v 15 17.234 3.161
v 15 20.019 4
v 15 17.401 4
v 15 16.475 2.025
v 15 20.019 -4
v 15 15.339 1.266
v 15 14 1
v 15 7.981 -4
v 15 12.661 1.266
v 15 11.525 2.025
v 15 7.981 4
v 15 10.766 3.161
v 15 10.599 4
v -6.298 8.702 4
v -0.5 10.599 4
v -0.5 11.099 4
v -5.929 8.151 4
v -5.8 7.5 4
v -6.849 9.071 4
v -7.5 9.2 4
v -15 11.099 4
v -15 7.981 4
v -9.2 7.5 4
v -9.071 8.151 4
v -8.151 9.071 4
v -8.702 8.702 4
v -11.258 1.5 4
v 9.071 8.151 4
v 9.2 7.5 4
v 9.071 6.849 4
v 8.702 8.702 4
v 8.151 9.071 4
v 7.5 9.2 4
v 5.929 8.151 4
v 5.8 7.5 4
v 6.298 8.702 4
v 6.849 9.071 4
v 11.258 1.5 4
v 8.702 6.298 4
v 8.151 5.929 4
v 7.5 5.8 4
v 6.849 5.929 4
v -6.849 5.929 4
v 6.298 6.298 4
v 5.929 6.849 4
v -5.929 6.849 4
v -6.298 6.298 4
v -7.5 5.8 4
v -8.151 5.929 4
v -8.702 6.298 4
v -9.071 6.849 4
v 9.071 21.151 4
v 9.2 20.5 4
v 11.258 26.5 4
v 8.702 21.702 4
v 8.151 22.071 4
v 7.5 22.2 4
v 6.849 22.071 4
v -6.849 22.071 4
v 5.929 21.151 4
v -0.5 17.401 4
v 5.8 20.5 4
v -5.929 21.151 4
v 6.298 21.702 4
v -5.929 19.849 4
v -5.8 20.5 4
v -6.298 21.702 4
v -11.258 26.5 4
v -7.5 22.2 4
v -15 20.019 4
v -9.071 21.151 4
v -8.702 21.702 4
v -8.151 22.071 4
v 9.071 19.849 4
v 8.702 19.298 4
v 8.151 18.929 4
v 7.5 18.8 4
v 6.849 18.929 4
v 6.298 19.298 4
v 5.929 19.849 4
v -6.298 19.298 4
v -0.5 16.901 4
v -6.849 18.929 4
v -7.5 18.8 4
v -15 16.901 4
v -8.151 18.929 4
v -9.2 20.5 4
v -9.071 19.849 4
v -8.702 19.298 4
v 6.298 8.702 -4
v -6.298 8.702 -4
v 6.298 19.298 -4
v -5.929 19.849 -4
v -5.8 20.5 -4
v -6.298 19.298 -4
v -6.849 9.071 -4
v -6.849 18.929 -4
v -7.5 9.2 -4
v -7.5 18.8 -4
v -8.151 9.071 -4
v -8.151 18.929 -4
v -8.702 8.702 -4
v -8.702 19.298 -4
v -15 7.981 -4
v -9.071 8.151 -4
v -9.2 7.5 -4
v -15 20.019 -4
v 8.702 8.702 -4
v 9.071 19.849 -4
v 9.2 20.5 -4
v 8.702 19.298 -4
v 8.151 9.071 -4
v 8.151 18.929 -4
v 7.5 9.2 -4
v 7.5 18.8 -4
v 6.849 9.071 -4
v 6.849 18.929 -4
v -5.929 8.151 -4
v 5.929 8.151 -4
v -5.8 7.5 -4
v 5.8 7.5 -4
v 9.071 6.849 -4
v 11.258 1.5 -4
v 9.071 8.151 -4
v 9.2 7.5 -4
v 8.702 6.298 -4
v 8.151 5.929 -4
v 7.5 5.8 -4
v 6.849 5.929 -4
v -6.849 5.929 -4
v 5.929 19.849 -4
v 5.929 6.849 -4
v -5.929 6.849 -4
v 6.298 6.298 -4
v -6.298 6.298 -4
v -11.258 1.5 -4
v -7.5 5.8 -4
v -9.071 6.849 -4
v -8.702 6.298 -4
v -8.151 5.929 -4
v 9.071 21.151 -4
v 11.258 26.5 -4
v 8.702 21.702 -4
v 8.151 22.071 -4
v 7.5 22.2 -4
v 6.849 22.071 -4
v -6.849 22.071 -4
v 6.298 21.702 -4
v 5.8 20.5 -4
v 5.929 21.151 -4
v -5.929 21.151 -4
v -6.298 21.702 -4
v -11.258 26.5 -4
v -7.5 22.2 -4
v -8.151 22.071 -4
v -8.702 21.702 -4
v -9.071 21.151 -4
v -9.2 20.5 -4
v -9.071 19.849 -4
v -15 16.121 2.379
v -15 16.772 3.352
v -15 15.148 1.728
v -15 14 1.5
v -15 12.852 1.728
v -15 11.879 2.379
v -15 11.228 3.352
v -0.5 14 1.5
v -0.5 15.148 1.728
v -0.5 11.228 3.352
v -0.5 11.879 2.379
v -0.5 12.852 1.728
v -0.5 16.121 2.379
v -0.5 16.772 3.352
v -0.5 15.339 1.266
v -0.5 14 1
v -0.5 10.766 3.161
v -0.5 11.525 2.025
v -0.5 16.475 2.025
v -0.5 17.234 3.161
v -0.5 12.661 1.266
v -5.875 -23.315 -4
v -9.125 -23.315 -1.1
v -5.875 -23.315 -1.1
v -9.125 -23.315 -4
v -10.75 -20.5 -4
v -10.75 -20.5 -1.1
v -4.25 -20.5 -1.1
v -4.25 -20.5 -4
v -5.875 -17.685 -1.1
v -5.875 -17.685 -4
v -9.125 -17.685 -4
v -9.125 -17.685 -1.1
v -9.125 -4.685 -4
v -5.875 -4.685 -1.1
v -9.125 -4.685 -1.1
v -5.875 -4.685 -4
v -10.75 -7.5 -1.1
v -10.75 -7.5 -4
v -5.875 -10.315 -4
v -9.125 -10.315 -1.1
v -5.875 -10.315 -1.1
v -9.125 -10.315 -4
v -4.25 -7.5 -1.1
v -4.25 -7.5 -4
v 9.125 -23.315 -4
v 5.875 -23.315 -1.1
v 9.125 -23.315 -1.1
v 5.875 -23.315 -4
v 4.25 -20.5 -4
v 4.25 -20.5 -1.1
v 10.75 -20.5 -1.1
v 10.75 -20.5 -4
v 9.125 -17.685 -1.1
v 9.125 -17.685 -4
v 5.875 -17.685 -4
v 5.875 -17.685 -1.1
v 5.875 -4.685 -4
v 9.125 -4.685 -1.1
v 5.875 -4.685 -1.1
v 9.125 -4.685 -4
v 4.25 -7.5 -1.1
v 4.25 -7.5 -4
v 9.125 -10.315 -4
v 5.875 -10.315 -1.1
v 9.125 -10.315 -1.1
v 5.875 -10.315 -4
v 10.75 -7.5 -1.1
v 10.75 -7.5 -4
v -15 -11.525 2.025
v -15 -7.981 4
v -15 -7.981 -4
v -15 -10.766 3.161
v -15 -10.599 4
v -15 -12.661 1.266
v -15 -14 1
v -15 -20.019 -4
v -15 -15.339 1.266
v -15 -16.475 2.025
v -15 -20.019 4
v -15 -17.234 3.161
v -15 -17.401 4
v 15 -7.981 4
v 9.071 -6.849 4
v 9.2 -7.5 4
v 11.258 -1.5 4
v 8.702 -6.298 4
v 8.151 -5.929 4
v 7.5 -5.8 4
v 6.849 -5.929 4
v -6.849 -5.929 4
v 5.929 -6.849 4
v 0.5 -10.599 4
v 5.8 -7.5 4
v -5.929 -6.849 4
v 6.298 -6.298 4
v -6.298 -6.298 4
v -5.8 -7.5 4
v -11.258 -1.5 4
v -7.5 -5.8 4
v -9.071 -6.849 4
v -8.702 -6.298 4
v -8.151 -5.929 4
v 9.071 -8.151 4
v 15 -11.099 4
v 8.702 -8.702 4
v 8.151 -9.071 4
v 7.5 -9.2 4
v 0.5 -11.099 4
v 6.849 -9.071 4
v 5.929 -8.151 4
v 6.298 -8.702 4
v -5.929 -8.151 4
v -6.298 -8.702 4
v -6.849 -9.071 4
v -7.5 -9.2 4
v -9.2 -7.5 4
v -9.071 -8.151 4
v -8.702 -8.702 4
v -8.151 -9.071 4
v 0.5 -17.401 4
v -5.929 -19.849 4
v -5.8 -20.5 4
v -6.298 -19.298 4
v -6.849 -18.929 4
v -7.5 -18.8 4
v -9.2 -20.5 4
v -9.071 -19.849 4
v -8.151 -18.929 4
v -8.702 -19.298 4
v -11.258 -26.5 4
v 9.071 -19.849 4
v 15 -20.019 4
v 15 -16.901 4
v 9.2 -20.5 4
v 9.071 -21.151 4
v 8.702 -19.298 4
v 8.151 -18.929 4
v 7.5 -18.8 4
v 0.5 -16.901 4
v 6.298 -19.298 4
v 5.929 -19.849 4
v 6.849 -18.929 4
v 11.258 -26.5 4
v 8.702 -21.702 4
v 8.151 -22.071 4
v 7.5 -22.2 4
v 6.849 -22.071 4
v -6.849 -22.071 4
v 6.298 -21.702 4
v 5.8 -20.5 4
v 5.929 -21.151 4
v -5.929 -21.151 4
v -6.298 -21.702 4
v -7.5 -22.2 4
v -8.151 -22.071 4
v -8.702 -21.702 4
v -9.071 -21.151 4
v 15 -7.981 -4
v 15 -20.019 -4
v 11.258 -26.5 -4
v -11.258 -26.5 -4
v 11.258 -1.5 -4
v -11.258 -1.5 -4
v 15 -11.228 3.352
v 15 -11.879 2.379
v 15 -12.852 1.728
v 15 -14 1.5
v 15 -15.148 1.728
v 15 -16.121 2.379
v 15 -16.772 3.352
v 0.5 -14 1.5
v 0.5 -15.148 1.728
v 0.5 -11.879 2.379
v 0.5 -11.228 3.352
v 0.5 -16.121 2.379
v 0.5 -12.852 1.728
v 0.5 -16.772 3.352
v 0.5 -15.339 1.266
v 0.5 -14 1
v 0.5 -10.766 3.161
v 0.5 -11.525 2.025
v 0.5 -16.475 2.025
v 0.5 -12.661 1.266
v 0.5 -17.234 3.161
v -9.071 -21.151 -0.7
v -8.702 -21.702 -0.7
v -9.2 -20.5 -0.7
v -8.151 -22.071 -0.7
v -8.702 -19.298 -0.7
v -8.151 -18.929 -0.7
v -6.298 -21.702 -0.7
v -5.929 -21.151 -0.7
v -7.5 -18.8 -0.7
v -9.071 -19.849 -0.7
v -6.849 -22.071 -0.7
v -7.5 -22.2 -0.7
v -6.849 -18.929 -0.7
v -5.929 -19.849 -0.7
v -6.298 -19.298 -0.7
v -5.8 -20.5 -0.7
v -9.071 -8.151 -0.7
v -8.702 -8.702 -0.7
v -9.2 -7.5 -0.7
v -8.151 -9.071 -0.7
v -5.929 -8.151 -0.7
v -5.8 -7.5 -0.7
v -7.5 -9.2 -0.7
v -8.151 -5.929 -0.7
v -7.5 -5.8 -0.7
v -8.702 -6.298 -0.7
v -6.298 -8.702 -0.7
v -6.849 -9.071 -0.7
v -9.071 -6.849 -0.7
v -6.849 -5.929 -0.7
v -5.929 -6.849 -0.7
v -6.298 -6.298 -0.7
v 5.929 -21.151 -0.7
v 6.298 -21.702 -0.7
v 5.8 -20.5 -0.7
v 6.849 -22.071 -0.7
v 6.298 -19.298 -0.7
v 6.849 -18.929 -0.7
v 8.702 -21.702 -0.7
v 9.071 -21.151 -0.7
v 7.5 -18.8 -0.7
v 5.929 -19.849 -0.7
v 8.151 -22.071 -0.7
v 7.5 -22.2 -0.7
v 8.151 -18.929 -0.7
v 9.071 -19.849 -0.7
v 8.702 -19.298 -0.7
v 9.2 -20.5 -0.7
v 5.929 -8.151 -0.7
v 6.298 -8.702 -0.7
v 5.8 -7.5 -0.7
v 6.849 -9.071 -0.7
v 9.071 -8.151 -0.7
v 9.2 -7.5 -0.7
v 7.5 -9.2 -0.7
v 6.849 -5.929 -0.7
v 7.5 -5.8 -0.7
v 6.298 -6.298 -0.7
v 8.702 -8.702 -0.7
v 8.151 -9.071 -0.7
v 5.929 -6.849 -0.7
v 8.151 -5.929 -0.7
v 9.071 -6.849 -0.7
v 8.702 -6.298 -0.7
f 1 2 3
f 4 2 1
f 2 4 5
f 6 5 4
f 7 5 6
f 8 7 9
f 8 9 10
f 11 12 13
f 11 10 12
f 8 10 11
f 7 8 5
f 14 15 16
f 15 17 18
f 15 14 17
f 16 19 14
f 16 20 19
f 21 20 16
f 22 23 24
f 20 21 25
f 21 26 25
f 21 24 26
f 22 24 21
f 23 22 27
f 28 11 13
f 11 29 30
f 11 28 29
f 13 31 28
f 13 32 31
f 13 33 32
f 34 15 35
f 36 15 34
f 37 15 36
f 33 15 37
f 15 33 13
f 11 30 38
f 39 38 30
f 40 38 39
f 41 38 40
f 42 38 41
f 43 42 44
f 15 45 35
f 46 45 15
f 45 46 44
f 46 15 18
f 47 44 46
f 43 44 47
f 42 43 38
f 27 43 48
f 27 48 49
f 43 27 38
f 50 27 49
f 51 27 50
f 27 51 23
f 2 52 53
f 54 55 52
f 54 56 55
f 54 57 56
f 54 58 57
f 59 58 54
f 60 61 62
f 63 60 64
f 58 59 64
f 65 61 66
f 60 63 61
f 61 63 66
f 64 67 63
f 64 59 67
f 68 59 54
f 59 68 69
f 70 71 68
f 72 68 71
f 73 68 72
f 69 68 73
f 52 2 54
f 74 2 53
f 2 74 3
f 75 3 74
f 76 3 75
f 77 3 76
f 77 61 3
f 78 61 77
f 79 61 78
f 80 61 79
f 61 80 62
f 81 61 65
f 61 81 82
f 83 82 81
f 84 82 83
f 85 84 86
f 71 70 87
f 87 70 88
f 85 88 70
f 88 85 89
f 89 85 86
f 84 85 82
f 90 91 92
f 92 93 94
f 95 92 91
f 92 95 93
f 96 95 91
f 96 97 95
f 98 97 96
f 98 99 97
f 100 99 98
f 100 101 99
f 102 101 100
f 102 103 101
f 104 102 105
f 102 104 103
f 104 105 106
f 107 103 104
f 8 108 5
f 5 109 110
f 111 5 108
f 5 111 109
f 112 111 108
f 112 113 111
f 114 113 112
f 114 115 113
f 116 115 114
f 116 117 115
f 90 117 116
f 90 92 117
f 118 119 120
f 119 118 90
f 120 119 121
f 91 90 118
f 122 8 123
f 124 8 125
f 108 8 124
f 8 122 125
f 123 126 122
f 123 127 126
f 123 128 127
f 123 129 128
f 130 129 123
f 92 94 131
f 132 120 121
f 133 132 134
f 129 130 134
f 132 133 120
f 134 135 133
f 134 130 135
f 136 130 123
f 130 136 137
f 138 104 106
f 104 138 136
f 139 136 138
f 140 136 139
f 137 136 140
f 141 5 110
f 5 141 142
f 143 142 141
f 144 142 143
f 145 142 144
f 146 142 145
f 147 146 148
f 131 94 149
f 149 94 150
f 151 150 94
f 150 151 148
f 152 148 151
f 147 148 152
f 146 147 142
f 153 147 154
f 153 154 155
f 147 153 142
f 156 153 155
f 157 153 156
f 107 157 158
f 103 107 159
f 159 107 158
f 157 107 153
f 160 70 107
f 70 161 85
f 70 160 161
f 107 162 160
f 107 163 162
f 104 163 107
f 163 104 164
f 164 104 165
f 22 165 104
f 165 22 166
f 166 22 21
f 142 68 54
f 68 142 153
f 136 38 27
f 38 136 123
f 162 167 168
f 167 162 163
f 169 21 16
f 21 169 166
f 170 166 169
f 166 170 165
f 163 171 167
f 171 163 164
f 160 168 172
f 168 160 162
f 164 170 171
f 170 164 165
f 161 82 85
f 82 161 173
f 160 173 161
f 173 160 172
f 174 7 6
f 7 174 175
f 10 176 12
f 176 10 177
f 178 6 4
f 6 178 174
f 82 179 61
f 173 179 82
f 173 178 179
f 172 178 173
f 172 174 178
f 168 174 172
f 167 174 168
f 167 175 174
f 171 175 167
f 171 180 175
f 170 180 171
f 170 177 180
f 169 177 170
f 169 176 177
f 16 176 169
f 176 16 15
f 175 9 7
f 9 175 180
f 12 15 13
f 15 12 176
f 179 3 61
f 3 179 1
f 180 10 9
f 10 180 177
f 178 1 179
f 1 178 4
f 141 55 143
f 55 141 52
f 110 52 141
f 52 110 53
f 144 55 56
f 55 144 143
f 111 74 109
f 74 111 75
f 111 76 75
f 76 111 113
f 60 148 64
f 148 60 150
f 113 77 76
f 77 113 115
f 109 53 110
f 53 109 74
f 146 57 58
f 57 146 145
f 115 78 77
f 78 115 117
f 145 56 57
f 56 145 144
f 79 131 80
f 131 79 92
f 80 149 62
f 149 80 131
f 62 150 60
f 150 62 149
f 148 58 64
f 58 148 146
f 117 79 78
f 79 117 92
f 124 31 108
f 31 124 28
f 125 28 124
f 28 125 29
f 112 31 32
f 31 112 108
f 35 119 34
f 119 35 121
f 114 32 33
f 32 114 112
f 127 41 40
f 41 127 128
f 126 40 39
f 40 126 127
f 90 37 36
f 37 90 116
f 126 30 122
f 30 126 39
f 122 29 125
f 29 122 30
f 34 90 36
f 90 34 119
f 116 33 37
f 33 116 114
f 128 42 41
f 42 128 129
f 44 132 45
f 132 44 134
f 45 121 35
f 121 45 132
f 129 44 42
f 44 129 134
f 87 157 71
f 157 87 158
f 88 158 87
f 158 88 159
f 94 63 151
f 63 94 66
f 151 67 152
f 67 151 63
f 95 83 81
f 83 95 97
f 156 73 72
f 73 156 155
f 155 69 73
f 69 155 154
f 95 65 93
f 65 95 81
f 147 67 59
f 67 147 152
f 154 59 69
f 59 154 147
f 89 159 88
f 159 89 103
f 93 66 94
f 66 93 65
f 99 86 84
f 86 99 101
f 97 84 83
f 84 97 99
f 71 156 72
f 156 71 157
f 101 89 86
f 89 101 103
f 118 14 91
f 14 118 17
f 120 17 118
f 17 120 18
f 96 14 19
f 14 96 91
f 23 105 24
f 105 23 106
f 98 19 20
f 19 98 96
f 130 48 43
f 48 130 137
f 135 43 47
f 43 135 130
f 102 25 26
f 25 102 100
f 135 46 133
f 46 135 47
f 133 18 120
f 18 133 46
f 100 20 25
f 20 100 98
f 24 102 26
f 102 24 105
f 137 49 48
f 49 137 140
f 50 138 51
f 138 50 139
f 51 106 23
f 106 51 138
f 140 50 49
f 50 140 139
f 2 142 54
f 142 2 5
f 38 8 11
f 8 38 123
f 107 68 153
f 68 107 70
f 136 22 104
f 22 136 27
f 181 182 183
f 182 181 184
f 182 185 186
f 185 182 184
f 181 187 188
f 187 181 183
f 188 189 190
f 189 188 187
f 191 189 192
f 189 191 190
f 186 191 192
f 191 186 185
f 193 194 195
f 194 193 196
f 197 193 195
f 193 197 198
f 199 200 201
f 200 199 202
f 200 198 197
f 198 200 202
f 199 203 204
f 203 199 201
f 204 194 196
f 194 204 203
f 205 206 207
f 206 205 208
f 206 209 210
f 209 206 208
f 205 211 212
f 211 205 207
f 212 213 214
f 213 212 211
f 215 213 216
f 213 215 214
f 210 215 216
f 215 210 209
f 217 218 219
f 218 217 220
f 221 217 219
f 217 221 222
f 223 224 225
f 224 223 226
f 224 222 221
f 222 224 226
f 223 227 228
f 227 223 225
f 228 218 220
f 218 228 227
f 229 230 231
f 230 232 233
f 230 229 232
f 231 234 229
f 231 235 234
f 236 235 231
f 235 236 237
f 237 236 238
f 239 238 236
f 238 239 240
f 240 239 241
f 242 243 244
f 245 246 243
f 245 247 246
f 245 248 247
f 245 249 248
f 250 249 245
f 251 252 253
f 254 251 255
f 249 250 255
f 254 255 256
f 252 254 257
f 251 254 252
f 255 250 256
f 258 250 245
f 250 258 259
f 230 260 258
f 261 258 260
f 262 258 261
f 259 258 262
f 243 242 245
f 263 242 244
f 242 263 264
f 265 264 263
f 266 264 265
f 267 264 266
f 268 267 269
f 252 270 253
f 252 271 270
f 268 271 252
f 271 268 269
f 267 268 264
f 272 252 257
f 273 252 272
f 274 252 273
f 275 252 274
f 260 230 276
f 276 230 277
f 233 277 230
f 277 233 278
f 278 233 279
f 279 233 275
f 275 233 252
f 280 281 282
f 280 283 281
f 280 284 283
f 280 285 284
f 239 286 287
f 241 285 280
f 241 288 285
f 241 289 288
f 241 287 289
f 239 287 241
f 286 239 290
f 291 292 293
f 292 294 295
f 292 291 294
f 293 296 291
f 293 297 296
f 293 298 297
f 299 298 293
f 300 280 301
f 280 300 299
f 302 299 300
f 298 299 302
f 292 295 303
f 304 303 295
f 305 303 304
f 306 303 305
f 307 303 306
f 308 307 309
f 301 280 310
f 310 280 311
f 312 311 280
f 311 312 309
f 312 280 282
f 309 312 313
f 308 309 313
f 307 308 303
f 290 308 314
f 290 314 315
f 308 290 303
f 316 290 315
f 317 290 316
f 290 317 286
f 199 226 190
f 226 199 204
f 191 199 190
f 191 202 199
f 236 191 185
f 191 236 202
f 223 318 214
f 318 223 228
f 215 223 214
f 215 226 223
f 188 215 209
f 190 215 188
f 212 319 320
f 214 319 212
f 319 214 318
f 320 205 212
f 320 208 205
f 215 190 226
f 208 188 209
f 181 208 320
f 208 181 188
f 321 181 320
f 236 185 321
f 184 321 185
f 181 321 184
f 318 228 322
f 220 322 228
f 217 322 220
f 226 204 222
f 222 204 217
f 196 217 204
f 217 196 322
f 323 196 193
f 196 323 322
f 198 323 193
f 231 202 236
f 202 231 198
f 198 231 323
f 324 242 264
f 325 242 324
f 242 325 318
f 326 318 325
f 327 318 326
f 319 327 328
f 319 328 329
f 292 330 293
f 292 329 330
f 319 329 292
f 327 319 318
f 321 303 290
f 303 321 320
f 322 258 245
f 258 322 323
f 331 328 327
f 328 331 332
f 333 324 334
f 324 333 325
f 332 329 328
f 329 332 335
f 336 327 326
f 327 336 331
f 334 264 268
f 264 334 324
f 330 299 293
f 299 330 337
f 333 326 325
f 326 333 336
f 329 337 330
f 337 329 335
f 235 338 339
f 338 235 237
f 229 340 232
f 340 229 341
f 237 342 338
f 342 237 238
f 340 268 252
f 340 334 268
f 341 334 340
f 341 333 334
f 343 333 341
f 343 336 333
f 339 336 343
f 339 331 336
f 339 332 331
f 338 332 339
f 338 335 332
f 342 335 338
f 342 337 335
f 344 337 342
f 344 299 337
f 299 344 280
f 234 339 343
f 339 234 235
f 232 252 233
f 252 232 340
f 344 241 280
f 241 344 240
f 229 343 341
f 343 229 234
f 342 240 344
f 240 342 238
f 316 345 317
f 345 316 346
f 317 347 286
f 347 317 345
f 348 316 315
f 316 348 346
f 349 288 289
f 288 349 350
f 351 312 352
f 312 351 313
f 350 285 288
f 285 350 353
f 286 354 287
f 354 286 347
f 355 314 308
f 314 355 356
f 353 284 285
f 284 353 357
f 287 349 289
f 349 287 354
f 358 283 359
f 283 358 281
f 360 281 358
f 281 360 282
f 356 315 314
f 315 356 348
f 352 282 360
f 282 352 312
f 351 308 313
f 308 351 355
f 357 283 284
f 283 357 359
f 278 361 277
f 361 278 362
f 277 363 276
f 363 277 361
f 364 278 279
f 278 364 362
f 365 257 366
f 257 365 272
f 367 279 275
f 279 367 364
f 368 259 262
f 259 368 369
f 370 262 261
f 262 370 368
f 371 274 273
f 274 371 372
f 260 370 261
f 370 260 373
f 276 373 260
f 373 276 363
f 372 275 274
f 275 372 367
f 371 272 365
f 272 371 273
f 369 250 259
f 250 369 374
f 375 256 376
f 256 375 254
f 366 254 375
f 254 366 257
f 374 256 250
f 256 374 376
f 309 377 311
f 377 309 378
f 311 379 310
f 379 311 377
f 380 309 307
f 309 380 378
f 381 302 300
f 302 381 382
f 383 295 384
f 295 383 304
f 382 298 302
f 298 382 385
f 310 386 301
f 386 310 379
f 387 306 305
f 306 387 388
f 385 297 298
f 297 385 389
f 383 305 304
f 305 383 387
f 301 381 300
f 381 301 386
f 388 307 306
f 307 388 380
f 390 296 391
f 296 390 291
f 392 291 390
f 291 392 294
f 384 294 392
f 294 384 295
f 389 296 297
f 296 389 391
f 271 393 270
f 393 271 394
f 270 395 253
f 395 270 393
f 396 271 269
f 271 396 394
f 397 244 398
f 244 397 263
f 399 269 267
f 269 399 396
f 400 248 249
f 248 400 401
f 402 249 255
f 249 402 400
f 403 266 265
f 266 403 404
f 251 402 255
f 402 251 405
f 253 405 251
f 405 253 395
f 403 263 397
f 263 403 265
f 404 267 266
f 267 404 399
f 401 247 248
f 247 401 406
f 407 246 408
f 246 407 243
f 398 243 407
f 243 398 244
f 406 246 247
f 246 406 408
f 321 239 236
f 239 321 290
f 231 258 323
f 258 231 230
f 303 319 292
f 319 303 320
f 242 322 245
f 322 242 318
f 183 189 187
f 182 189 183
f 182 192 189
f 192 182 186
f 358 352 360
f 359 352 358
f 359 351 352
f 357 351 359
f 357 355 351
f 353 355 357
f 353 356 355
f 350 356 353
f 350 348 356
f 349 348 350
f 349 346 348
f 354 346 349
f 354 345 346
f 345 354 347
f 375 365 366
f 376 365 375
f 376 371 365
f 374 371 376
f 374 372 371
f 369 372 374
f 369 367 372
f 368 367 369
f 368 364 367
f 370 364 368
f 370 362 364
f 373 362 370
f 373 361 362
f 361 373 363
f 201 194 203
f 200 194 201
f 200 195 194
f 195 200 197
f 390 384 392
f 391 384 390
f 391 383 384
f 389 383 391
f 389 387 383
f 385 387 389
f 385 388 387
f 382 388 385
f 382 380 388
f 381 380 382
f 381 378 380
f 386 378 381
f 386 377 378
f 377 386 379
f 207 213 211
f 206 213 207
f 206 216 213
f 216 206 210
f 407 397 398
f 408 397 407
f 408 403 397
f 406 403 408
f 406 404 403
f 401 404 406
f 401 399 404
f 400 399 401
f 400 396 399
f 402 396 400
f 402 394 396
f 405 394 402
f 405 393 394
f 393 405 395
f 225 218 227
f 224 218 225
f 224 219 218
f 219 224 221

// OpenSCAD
holeX = 7.5;
holeY = 6.5;

holeR = 3.4 / 2;
nutR = 3.25;
nutH = 3;
corner_cut = 26;

studding_dia = 6.0;  // default 8
shaft_dia = 7.0;

module coupling(c){
    union(){
        difference(){
            cube(size = [30,25,8], center = true);

            if(c==1){
                //slot
            	*cube(size = [2,40,30], center = true);
                
                //nut holes
            	translate([ holeX,  holeY, nutH/2 - 4.01]) cylinder(h = nutH, r=nutR, $fn=6, center=true);
            	translate([ holeX, -holeY, nutH/2 - 4.01]) cylinder(h = nutH, r=nutR, $fn=6, center=true);
            	translate([-holeX,  holeY, nutH/2 - 4.01]) cylinder(h = nutH, r=nutR, $fn=6, center=true);
            	translate([-holeX, -holeY, nutH/2 - 4.01]) cylinder(h = nutH, r=nutR, $fn=6, center=true);
            }

            //shaft groves
            translate([ -16, 0, 4.5]) rotate([0,90,0]) cylinder(h = 16, r=studding_dia / 2, $fn=16);
            translate([-0.5, 0, 4.5]) rotate([0,90,0]) cylinder(h = 16, r=shaft_dia / 2,    $fn=16);

            //screw holes
            translate([ holeX,  holeY, -10]) cylinder(h = 20, r=holeR, $fn=16);
            translate([ holeX, -holeY, -10]) cylinder(h = 20, r=holeR, $fn=16);
            translate([-holeX,  holeY, -10]) cylinder(h = 20, r=holeR, $fn=16);
            translate([-holeX, -holeY, -10]) cylinder(h = 20, r=holeR, $fn=16);

            //corners
            rotate([0,0,30])   translate([corner_cut, 0, 0]) cube(size = [20,40,20], center = true);
            rotate([0,0,-30])  translate([corner_cut, 0, 0]) cube(size = [20,40,20], center = true);
            rotate([0,0,150])  translate([corner_cut, 0, 0]) cube(size = [20,40,20], center = true);
            rotate([0,0,-150]) translate([corner_cut, 0, 0]) cube(size = [20,40,20], center = true);
        }
        if(c==1){
            // bridge
        	translate([ holeX,  holeY, nutH-3.9]) cylinder(h = 0.4, r=nutR+0.1, $fn=6, center=true);
        	translate([ holeX, -holeY, nutH-3.9]) cylinder(h = 0.4, r=nutR+0.1, $fn=6, center=true);
        	translate([-holeX,  holeY, nutH-3.9]) cylinder(h = 0.4, r=nutR+0.1, $fn=6, center=true);
        	translate([-holeX, -holeY, nutH-3.9]) cylinder(h = 0.4, r=nutR+0.1, $fn=6, center=true);
        }
    }
}

translate([0, 14, 0]) coupling(c=0);
translate([0, -14, 0]) rotate([0,0,180]) coupling(c=1);
